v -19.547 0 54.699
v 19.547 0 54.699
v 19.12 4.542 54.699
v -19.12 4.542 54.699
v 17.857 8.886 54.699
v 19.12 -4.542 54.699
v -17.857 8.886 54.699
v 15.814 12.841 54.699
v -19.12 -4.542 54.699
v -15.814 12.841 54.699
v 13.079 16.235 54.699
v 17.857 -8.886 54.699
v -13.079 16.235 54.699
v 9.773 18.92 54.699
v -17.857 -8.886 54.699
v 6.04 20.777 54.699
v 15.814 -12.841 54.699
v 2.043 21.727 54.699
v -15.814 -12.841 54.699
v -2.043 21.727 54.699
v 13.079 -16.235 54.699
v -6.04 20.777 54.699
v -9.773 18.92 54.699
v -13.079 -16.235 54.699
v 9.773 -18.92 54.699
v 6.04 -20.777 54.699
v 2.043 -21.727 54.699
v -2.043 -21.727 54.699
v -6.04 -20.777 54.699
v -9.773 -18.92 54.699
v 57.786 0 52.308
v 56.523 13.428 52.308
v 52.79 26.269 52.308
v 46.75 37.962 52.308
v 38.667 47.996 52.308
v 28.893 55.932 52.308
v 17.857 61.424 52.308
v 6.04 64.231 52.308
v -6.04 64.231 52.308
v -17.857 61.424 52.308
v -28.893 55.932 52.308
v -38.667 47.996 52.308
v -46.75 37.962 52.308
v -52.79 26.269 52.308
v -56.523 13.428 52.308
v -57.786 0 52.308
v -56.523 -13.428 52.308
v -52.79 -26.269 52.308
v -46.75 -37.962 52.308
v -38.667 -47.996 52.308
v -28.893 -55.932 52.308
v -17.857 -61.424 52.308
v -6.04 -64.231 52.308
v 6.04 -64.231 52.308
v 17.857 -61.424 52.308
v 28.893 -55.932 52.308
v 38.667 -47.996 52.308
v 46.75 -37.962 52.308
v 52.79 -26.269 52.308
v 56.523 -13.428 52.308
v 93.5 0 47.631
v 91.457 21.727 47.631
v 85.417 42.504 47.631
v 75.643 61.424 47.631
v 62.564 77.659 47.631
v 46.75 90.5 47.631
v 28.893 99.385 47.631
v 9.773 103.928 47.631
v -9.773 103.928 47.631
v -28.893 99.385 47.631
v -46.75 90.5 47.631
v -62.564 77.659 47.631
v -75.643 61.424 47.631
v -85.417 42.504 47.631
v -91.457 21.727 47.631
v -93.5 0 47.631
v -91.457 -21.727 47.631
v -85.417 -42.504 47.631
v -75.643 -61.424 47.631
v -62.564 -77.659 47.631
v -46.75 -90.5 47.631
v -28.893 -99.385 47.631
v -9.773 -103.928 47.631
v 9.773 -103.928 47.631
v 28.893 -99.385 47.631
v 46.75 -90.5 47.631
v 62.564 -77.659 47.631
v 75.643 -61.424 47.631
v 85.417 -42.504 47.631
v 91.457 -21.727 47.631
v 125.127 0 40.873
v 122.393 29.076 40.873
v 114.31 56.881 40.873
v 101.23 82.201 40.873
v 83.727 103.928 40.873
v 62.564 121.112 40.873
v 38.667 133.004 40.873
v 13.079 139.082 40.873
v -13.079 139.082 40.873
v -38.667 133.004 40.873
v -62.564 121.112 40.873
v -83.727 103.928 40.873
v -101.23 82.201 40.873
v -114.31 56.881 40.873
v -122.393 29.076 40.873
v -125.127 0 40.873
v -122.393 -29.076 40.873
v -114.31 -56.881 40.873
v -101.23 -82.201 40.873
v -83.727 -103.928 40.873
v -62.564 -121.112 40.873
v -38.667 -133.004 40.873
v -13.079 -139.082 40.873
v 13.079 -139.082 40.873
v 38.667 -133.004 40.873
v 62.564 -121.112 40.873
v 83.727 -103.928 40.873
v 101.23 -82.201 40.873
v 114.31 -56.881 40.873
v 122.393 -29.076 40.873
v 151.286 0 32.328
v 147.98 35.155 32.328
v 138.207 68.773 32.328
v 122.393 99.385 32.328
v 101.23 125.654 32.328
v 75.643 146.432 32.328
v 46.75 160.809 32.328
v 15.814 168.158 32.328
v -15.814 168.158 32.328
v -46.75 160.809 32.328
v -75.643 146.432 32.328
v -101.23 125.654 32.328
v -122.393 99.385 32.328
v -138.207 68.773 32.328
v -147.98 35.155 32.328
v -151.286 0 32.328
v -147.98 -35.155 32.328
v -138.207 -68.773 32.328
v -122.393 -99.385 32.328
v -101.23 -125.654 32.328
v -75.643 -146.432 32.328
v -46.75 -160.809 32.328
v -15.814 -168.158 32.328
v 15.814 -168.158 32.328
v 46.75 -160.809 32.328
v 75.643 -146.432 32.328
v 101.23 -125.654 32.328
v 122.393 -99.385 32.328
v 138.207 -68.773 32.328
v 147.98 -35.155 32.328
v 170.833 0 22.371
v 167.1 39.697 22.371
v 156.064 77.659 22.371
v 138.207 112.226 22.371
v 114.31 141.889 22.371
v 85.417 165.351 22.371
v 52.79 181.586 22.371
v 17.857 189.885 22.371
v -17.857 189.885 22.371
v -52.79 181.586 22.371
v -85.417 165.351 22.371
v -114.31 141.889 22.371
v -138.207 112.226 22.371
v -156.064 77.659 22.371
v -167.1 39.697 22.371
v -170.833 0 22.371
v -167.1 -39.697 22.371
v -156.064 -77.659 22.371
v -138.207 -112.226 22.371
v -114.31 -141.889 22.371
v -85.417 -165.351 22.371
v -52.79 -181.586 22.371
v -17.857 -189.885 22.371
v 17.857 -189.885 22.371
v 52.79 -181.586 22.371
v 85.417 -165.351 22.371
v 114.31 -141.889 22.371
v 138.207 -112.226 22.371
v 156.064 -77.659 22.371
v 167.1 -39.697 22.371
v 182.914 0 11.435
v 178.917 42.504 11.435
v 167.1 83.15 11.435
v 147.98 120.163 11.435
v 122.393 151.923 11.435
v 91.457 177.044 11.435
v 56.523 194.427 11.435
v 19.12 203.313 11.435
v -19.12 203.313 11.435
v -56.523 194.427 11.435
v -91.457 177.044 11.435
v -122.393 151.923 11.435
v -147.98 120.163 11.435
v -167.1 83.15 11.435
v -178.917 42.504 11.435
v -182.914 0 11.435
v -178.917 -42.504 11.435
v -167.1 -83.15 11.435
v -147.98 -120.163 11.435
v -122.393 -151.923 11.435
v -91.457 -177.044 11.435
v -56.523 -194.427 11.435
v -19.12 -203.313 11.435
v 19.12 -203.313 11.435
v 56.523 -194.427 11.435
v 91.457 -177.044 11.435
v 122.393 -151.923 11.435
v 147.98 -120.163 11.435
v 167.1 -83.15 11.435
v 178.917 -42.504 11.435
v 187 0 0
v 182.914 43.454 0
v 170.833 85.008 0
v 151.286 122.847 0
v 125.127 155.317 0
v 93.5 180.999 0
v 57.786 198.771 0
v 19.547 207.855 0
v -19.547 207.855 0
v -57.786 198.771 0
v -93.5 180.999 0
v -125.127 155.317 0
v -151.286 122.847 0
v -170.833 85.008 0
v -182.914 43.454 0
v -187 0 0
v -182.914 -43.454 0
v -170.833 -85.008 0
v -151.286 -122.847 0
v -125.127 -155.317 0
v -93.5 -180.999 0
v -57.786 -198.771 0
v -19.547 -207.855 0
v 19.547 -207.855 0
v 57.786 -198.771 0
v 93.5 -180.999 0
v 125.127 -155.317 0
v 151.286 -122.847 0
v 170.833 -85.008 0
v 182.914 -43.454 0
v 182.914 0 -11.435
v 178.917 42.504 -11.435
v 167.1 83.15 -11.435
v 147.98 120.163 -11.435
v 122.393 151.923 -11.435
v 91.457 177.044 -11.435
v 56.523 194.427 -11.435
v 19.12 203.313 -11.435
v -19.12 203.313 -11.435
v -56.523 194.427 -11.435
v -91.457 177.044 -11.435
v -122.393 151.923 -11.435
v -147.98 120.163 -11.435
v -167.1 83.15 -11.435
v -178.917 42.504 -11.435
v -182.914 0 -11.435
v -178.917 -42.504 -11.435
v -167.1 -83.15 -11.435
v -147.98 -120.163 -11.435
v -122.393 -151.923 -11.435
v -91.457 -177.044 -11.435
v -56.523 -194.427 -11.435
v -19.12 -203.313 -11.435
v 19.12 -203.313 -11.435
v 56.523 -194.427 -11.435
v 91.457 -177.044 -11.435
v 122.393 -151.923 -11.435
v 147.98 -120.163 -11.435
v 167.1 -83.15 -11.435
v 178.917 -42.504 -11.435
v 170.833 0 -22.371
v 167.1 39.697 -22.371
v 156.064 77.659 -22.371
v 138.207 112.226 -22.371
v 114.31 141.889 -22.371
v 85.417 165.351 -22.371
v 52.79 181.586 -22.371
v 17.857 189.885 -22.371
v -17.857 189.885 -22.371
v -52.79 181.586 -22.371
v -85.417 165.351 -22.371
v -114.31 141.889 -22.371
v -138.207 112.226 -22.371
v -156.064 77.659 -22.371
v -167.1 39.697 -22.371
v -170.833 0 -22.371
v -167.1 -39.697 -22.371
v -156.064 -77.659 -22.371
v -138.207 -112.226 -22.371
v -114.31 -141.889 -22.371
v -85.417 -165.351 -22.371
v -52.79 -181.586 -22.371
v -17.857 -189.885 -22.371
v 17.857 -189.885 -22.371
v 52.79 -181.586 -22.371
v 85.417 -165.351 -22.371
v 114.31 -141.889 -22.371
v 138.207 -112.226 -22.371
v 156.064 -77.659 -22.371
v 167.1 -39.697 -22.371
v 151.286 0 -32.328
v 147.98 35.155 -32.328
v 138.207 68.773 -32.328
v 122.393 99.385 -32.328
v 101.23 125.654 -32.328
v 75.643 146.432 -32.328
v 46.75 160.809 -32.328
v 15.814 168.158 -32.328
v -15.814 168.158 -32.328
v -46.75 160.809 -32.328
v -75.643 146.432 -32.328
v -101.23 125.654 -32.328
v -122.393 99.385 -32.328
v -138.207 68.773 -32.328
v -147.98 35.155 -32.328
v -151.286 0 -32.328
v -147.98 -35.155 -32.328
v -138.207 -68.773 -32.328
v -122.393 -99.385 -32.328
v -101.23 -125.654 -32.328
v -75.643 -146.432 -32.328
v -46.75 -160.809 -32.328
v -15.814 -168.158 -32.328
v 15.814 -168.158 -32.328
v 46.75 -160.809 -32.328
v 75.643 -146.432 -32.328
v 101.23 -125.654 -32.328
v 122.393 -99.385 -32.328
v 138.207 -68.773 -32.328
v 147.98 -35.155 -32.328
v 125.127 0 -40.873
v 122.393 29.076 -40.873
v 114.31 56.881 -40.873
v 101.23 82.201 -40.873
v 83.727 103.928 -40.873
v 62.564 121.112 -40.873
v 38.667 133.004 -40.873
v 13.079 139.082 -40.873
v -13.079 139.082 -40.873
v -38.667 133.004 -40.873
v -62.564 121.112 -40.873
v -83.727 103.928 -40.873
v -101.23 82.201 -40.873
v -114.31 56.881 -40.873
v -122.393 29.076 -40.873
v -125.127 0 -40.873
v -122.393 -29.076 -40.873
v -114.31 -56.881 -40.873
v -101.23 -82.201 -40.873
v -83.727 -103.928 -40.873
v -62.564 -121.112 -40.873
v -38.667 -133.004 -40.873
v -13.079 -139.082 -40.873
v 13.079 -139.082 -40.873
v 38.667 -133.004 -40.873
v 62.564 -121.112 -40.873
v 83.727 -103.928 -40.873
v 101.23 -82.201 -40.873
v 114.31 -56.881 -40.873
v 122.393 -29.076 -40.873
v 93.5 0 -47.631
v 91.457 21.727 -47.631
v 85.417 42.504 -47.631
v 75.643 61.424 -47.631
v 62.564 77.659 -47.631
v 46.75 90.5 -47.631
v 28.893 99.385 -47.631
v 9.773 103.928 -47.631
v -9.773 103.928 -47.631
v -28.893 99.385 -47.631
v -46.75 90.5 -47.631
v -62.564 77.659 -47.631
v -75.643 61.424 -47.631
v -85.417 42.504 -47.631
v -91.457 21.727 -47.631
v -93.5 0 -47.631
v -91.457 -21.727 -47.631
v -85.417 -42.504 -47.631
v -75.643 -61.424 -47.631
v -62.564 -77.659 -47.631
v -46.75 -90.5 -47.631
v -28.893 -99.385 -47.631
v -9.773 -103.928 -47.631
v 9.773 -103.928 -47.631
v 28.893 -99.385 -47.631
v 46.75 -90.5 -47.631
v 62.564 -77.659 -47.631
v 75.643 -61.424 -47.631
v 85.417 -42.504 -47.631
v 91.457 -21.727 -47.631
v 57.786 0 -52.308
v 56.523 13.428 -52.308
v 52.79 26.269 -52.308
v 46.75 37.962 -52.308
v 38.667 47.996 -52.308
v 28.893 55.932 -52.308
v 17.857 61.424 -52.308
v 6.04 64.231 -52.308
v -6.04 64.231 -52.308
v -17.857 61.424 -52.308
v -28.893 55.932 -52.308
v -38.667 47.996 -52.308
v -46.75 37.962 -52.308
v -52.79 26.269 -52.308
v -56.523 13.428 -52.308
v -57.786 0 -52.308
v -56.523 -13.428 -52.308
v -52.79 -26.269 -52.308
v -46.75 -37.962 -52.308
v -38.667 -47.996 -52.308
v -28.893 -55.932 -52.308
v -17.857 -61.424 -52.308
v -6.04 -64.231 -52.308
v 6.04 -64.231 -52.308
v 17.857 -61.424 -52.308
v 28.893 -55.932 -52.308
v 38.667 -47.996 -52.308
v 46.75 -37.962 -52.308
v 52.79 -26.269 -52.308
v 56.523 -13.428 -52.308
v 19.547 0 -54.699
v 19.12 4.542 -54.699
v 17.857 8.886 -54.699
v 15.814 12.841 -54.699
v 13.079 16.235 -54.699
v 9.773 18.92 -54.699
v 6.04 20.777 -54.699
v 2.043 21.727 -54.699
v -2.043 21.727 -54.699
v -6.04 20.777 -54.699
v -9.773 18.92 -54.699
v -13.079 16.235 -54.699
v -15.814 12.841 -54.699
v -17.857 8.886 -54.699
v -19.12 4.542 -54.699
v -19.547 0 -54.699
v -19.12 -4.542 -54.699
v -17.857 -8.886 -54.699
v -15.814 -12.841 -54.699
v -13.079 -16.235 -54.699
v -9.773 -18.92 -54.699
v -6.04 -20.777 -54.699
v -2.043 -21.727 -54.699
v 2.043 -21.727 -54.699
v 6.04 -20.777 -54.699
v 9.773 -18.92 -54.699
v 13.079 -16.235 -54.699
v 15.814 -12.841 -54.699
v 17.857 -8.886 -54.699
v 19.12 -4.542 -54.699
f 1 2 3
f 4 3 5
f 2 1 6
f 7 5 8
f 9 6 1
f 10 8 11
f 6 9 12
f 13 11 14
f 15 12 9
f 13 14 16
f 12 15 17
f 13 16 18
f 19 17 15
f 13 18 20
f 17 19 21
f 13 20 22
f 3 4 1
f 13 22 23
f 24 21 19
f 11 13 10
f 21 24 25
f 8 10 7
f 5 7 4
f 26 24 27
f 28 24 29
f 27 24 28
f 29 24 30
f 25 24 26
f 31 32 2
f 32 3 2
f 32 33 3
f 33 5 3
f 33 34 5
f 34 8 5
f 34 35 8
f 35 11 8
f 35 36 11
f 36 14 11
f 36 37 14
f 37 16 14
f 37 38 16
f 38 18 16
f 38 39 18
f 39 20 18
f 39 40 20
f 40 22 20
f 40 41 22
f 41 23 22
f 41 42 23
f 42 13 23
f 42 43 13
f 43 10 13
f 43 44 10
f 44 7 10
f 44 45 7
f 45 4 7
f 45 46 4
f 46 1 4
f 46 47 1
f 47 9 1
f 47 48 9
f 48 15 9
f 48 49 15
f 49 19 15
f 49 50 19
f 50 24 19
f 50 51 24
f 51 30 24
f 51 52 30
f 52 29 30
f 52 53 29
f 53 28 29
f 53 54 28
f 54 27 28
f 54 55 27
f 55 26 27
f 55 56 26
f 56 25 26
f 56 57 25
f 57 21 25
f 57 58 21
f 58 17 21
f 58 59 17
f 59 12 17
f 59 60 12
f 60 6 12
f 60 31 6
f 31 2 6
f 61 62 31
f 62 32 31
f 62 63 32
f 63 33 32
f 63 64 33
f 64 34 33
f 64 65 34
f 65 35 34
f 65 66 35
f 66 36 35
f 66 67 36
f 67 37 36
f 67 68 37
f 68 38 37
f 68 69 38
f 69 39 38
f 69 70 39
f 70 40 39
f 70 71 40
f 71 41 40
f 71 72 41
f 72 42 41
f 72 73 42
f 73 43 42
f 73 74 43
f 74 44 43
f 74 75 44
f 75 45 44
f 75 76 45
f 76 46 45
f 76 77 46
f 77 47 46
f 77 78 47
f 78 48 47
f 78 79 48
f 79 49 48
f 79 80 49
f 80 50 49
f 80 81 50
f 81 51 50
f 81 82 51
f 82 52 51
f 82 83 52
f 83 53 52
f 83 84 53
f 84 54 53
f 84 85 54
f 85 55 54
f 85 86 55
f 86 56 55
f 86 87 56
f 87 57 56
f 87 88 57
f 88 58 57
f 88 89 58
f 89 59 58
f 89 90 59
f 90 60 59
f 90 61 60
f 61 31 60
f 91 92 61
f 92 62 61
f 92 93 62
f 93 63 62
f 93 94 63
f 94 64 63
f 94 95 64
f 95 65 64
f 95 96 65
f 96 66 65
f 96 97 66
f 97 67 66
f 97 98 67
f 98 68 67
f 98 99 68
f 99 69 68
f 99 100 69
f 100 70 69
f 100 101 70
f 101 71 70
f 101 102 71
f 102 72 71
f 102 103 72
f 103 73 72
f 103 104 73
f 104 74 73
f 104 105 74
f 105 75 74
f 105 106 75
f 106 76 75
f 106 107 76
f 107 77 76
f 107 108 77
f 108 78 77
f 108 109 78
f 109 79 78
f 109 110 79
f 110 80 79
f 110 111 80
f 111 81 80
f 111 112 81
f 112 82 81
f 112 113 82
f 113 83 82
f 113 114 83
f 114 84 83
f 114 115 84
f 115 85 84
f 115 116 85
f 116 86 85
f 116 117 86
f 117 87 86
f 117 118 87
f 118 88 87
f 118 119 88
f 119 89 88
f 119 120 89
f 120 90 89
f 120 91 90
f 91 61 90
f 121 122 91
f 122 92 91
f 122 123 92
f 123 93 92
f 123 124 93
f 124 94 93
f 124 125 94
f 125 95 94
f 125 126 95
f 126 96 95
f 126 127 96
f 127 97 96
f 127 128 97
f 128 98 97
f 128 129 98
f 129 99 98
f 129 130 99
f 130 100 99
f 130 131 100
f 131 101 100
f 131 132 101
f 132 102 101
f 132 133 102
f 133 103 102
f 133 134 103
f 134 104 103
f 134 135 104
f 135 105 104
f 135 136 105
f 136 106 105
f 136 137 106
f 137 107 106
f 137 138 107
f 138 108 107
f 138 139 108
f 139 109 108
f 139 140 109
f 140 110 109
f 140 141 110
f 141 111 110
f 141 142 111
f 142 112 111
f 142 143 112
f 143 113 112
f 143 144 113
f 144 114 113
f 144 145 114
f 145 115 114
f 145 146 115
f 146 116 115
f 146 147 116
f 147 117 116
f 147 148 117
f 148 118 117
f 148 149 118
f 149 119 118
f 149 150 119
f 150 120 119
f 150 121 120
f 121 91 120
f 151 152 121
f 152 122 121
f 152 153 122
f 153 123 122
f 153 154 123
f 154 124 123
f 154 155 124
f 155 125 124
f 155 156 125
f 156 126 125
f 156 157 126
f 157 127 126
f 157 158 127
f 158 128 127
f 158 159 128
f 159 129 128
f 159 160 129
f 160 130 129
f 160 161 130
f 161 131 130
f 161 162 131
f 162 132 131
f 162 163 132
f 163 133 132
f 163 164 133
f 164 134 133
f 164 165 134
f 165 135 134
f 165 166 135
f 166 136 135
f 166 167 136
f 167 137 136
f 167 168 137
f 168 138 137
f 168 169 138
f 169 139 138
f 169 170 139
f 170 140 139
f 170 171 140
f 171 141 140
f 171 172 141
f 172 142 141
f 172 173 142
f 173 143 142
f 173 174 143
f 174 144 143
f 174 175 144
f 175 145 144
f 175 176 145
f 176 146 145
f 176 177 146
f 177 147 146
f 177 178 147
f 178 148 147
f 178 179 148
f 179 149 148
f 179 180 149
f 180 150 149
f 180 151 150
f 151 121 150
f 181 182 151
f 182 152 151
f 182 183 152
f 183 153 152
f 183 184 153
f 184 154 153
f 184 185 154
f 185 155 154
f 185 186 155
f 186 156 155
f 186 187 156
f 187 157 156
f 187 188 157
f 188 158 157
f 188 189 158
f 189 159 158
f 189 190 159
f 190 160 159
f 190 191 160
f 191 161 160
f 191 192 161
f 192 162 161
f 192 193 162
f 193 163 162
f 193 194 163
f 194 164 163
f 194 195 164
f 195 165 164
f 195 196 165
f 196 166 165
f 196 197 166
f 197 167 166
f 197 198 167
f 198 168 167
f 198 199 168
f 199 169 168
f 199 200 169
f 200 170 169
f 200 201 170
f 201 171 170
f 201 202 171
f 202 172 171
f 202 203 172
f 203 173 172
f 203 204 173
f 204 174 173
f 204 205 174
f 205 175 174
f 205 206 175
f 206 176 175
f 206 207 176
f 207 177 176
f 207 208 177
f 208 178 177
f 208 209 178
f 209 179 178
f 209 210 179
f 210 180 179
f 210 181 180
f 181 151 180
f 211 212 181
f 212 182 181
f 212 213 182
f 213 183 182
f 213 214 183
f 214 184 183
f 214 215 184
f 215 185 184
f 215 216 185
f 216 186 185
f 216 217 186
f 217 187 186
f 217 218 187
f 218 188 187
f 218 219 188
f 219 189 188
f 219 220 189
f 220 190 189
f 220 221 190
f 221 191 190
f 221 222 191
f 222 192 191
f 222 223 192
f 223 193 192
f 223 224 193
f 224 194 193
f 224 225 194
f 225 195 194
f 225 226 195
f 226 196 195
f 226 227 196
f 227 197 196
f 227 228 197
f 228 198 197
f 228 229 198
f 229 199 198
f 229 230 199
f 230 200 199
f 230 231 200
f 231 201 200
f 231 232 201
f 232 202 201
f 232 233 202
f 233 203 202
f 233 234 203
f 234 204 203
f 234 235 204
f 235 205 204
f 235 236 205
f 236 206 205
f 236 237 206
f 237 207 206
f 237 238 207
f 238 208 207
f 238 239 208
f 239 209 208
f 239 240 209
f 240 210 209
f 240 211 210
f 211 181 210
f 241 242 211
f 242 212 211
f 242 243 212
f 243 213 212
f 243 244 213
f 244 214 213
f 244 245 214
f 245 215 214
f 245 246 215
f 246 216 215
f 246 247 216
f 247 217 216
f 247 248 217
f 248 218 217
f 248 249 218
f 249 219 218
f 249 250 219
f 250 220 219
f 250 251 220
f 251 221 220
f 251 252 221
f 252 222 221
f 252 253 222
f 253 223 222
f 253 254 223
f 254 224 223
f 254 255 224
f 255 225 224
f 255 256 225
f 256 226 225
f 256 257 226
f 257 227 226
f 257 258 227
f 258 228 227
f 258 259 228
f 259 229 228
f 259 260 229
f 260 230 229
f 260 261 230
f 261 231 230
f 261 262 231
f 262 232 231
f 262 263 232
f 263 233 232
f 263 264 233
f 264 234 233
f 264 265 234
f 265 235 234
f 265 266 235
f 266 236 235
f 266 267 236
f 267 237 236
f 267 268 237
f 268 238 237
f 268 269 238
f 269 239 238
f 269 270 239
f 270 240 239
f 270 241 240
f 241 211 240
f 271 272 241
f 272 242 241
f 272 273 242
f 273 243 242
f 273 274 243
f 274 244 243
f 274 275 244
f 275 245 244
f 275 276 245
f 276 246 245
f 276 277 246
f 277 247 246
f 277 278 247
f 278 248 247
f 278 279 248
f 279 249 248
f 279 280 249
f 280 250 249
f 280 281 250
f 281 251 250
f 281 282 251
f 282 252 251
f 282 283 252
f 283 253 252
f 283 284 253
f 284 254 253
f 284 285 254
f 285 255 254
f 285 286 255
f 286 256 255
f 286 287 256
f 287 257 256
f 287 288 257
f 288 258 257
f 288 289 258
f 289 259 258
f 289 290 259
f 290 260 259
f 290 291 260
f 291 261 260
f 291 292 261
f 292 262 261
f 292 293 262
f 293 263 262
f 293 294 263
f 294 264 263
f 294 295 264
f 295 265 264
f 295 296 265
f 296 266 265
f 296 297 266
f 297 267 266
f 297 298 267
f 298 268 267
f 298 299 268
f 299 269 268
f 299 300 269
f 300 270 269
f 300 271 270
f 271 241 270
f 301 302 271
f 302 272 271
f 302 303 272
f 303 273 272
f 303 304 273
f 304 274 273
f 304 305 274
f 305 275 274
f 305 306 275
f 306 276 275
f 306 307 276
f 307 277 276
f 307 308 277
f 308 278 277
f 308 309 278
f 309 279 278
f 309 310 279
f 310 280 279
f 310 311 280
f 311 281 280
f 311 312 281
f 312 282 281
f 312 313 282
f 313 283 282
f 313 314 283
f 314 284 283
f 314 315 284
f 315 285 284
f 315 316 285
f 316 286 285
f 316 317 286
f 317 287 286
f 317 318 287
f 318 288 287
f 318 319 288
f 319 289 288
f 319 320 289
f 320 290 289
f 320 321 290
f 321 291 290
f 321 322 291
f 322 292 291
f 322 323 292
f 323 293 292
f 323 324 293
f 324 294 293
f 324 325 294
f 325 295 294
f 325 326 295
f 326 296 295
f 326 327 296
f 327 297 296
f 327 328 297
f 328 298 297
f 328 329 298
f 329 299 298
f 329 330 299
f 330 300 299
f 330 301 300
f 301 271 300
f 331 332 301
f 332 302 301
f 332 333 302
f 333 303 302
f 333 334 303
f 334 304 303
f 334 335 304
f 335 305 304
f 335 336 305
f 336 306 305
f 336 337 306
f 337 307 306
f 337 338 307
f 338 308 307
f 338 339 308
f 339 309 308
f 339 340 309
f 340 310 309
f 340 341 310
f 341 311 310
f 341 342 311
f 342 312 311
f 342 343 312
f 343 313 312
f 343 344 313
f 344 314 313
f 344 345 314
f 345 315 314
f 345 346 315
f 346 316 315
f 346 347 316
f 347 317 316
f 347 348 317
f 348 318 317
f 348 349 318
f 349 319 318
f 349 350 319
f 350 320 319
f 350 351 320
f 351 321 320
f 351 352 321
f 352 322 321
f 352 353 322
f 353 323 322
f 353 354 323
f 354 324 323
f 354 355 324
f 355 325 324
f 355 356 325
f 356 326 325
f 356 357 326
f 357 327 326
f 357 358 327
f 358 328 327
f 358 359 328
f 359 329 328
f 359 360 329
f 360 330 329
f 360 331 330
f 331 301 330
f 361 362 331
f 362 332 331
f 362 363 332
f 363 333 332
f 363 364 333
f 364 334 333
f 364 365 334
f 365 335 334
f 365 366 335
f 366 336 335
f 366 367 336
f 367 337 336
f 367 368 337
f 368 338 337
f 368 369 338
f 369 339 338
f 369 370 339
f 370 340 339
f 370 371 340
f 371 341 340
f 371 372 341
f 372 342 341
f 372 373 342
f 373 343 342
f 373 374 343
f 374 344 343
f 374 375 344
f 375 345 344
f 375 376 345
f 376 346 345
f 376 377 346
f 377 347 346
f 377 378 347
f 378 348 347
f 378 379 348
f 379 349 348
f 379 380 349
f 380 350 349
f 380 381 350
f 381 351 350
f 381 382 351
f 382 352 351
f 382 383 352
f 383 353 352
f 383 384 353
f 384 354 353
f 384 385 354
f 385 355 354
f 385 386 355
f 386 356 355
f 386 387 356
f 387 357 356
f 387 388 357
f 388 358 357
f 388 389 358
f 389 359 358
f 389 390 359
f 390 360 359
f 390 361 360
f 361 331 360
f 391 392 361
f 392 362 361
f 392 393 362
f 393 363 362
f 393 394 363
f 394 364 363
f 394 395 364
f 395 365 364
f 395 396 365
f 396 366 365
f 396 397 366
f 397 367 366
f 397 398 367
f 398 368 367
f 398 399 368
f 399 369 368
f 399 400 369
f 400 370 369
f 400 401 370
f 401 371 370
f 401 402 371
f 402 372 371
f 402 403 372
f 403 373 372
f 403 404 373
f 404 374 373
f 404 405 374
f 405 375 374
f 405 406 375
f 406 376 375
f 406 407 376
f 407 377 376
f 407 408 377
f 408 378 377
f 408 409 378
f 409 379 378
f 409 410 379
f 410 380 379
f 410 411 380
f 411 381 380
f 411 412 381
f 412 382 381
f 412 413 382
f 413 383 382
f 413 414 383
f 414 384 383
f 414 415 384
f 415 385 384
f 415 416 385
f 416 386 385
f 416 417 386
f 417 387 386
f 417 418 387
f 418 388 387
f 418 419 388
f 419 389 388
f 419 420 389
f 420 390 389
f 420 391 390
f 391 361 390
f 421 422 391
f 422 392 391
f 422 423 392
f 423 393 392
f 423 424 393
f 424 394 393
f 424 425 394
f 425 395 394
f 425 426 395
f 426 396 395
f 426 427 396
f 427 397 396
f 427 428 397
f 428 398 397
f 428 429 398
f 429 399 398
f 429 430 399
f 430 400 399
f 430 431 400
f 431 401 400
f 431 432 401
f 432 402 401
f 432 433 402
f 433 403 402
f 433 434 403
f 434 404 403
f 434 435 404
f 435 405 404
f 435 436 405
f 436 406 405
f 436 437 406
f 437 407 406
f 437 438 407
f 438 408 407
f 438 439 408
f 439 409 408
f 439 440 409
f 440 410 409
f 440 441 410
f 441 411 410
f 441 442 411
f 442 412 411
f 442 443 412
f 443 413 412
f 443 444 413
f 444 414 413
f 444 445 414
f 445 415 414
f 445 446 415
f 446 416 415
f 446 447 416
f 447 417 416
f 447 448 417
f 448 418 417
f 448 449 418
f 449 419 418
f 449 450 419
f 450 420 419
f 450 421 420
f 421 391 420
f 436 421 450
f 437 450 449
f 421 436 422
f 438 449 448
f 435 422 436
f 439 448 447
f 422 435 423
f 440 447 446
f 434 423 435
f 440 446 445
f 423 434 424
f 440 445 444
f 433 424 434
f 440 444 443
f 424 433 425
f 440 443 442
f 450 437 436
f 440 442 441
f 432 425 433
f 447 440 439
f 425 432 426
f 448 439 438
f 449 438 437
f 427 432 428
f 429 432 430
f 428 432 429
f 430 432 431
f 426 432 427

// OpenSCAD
// Generated by SolidPython 1.0.1 on 2020-07-29 00:46:53


scale(v = [17, 19, 5]) {
	sphere(r = 11);
}
/***********************************************
*********      SolidPython code:      **********
************************************************
 
# import packages: SolidPython
from solid import *
from solid.utils import *
from itertools import chain, combinations, permutations


class Resize:

    def __init__(self, scad_file):
        self.scad_file = scad_file
        #self.scad_file = import_scad(scad_file)
        # cone/cylinder param:
        self.r1 = 0
        self.r2 = 0
        self.h = 0
        # rectangular prism param:
        self.w = 0
        self.l = 0
        # ellipse param:
        self.r = 0

    # import OpenScad code (file name corresponds to shape)


    # classify shape + parameters
    def assign(self, param1, param2, param3):
        if self.scad_file == 'cone.scad':
            self.r1 = param1
            self.r2 = param2
            self.h = param3
        elif self.scad_file == 'cylinder.scad':
            self.r1 = param1
            self.r2 = param2
            self.h = param3
        elif self.scad_file == 'rectangularPrism.scad':
            self.h = param1
            self.l = param2
            self.w = param3
        else:
            self.r = param1
            self.h = param2

    # resize parameters
    def iterate(self):
        x = range(3, 20, 2)
        i = 1
        if self.scad_file == 'cone.scad':
            tempList = list(permutations(x, 2))
            for temp in tempList:
                param1 = temp[0]
                param2 = temp[1]
                filepath = 'produced_scad_files/' + 'cone' + str(param1) + '_' + str(param2) + '_' + '.scad'
                scad_render_to_file(cylinder(h=param1, r1=param2, r2=0), filepath)

        elif self.scad_file == 'cylinder.scad':
            tempList = list(permutations(x, 3))
            for temp in tempList:
                param1 = temp[0]
                param2 = temp[1]
                filepath = 'produced_scad_files/' + 'cylinder' + str(param1) + '_' + str(param2) + '_' + '.scad'
                scad_render_to_file(cylinder(h=param1, r1=param2, r2=param2), filepath)

        elif self.scad_file == 'rectangularPrism.scad':
            tempList = list(permutations(x, 3))
            for temp in tempList:
                param1 = temp[0]
                param2 = temp[1]
                param3 = temp[2]
                filepath = 'produced_scad_files/' + 'rectangularPrism' + str(param1) + '_' + str(param2) + '_' + str(
                    param3) + '.scad'
                scad_render_to_file(cube(size=(param1, param2, param3)), filepath)

        elif self.scad_file == 'ellipse.scad':
            tempList = list(permutations(x, 4))
            for temp in tempList:
                param1 = temp[0]
                param2 = temp[1]
                param3 = temp[2]
                param4 = temp[3]
                filepath = 'produced_scad_files/' + 'ellipse' + str(param1) + '_' + str(param2) + '_' + str(param3) + '_' + str(param4) + '.scad'
                scad_render_to_file(scale([param1, param2, param3])(sphere(r=param4)), filepath)

    def render_to_scadfile(self):
        scad_render_to_file(scad, 'example.scad') 
 
************************************************/
